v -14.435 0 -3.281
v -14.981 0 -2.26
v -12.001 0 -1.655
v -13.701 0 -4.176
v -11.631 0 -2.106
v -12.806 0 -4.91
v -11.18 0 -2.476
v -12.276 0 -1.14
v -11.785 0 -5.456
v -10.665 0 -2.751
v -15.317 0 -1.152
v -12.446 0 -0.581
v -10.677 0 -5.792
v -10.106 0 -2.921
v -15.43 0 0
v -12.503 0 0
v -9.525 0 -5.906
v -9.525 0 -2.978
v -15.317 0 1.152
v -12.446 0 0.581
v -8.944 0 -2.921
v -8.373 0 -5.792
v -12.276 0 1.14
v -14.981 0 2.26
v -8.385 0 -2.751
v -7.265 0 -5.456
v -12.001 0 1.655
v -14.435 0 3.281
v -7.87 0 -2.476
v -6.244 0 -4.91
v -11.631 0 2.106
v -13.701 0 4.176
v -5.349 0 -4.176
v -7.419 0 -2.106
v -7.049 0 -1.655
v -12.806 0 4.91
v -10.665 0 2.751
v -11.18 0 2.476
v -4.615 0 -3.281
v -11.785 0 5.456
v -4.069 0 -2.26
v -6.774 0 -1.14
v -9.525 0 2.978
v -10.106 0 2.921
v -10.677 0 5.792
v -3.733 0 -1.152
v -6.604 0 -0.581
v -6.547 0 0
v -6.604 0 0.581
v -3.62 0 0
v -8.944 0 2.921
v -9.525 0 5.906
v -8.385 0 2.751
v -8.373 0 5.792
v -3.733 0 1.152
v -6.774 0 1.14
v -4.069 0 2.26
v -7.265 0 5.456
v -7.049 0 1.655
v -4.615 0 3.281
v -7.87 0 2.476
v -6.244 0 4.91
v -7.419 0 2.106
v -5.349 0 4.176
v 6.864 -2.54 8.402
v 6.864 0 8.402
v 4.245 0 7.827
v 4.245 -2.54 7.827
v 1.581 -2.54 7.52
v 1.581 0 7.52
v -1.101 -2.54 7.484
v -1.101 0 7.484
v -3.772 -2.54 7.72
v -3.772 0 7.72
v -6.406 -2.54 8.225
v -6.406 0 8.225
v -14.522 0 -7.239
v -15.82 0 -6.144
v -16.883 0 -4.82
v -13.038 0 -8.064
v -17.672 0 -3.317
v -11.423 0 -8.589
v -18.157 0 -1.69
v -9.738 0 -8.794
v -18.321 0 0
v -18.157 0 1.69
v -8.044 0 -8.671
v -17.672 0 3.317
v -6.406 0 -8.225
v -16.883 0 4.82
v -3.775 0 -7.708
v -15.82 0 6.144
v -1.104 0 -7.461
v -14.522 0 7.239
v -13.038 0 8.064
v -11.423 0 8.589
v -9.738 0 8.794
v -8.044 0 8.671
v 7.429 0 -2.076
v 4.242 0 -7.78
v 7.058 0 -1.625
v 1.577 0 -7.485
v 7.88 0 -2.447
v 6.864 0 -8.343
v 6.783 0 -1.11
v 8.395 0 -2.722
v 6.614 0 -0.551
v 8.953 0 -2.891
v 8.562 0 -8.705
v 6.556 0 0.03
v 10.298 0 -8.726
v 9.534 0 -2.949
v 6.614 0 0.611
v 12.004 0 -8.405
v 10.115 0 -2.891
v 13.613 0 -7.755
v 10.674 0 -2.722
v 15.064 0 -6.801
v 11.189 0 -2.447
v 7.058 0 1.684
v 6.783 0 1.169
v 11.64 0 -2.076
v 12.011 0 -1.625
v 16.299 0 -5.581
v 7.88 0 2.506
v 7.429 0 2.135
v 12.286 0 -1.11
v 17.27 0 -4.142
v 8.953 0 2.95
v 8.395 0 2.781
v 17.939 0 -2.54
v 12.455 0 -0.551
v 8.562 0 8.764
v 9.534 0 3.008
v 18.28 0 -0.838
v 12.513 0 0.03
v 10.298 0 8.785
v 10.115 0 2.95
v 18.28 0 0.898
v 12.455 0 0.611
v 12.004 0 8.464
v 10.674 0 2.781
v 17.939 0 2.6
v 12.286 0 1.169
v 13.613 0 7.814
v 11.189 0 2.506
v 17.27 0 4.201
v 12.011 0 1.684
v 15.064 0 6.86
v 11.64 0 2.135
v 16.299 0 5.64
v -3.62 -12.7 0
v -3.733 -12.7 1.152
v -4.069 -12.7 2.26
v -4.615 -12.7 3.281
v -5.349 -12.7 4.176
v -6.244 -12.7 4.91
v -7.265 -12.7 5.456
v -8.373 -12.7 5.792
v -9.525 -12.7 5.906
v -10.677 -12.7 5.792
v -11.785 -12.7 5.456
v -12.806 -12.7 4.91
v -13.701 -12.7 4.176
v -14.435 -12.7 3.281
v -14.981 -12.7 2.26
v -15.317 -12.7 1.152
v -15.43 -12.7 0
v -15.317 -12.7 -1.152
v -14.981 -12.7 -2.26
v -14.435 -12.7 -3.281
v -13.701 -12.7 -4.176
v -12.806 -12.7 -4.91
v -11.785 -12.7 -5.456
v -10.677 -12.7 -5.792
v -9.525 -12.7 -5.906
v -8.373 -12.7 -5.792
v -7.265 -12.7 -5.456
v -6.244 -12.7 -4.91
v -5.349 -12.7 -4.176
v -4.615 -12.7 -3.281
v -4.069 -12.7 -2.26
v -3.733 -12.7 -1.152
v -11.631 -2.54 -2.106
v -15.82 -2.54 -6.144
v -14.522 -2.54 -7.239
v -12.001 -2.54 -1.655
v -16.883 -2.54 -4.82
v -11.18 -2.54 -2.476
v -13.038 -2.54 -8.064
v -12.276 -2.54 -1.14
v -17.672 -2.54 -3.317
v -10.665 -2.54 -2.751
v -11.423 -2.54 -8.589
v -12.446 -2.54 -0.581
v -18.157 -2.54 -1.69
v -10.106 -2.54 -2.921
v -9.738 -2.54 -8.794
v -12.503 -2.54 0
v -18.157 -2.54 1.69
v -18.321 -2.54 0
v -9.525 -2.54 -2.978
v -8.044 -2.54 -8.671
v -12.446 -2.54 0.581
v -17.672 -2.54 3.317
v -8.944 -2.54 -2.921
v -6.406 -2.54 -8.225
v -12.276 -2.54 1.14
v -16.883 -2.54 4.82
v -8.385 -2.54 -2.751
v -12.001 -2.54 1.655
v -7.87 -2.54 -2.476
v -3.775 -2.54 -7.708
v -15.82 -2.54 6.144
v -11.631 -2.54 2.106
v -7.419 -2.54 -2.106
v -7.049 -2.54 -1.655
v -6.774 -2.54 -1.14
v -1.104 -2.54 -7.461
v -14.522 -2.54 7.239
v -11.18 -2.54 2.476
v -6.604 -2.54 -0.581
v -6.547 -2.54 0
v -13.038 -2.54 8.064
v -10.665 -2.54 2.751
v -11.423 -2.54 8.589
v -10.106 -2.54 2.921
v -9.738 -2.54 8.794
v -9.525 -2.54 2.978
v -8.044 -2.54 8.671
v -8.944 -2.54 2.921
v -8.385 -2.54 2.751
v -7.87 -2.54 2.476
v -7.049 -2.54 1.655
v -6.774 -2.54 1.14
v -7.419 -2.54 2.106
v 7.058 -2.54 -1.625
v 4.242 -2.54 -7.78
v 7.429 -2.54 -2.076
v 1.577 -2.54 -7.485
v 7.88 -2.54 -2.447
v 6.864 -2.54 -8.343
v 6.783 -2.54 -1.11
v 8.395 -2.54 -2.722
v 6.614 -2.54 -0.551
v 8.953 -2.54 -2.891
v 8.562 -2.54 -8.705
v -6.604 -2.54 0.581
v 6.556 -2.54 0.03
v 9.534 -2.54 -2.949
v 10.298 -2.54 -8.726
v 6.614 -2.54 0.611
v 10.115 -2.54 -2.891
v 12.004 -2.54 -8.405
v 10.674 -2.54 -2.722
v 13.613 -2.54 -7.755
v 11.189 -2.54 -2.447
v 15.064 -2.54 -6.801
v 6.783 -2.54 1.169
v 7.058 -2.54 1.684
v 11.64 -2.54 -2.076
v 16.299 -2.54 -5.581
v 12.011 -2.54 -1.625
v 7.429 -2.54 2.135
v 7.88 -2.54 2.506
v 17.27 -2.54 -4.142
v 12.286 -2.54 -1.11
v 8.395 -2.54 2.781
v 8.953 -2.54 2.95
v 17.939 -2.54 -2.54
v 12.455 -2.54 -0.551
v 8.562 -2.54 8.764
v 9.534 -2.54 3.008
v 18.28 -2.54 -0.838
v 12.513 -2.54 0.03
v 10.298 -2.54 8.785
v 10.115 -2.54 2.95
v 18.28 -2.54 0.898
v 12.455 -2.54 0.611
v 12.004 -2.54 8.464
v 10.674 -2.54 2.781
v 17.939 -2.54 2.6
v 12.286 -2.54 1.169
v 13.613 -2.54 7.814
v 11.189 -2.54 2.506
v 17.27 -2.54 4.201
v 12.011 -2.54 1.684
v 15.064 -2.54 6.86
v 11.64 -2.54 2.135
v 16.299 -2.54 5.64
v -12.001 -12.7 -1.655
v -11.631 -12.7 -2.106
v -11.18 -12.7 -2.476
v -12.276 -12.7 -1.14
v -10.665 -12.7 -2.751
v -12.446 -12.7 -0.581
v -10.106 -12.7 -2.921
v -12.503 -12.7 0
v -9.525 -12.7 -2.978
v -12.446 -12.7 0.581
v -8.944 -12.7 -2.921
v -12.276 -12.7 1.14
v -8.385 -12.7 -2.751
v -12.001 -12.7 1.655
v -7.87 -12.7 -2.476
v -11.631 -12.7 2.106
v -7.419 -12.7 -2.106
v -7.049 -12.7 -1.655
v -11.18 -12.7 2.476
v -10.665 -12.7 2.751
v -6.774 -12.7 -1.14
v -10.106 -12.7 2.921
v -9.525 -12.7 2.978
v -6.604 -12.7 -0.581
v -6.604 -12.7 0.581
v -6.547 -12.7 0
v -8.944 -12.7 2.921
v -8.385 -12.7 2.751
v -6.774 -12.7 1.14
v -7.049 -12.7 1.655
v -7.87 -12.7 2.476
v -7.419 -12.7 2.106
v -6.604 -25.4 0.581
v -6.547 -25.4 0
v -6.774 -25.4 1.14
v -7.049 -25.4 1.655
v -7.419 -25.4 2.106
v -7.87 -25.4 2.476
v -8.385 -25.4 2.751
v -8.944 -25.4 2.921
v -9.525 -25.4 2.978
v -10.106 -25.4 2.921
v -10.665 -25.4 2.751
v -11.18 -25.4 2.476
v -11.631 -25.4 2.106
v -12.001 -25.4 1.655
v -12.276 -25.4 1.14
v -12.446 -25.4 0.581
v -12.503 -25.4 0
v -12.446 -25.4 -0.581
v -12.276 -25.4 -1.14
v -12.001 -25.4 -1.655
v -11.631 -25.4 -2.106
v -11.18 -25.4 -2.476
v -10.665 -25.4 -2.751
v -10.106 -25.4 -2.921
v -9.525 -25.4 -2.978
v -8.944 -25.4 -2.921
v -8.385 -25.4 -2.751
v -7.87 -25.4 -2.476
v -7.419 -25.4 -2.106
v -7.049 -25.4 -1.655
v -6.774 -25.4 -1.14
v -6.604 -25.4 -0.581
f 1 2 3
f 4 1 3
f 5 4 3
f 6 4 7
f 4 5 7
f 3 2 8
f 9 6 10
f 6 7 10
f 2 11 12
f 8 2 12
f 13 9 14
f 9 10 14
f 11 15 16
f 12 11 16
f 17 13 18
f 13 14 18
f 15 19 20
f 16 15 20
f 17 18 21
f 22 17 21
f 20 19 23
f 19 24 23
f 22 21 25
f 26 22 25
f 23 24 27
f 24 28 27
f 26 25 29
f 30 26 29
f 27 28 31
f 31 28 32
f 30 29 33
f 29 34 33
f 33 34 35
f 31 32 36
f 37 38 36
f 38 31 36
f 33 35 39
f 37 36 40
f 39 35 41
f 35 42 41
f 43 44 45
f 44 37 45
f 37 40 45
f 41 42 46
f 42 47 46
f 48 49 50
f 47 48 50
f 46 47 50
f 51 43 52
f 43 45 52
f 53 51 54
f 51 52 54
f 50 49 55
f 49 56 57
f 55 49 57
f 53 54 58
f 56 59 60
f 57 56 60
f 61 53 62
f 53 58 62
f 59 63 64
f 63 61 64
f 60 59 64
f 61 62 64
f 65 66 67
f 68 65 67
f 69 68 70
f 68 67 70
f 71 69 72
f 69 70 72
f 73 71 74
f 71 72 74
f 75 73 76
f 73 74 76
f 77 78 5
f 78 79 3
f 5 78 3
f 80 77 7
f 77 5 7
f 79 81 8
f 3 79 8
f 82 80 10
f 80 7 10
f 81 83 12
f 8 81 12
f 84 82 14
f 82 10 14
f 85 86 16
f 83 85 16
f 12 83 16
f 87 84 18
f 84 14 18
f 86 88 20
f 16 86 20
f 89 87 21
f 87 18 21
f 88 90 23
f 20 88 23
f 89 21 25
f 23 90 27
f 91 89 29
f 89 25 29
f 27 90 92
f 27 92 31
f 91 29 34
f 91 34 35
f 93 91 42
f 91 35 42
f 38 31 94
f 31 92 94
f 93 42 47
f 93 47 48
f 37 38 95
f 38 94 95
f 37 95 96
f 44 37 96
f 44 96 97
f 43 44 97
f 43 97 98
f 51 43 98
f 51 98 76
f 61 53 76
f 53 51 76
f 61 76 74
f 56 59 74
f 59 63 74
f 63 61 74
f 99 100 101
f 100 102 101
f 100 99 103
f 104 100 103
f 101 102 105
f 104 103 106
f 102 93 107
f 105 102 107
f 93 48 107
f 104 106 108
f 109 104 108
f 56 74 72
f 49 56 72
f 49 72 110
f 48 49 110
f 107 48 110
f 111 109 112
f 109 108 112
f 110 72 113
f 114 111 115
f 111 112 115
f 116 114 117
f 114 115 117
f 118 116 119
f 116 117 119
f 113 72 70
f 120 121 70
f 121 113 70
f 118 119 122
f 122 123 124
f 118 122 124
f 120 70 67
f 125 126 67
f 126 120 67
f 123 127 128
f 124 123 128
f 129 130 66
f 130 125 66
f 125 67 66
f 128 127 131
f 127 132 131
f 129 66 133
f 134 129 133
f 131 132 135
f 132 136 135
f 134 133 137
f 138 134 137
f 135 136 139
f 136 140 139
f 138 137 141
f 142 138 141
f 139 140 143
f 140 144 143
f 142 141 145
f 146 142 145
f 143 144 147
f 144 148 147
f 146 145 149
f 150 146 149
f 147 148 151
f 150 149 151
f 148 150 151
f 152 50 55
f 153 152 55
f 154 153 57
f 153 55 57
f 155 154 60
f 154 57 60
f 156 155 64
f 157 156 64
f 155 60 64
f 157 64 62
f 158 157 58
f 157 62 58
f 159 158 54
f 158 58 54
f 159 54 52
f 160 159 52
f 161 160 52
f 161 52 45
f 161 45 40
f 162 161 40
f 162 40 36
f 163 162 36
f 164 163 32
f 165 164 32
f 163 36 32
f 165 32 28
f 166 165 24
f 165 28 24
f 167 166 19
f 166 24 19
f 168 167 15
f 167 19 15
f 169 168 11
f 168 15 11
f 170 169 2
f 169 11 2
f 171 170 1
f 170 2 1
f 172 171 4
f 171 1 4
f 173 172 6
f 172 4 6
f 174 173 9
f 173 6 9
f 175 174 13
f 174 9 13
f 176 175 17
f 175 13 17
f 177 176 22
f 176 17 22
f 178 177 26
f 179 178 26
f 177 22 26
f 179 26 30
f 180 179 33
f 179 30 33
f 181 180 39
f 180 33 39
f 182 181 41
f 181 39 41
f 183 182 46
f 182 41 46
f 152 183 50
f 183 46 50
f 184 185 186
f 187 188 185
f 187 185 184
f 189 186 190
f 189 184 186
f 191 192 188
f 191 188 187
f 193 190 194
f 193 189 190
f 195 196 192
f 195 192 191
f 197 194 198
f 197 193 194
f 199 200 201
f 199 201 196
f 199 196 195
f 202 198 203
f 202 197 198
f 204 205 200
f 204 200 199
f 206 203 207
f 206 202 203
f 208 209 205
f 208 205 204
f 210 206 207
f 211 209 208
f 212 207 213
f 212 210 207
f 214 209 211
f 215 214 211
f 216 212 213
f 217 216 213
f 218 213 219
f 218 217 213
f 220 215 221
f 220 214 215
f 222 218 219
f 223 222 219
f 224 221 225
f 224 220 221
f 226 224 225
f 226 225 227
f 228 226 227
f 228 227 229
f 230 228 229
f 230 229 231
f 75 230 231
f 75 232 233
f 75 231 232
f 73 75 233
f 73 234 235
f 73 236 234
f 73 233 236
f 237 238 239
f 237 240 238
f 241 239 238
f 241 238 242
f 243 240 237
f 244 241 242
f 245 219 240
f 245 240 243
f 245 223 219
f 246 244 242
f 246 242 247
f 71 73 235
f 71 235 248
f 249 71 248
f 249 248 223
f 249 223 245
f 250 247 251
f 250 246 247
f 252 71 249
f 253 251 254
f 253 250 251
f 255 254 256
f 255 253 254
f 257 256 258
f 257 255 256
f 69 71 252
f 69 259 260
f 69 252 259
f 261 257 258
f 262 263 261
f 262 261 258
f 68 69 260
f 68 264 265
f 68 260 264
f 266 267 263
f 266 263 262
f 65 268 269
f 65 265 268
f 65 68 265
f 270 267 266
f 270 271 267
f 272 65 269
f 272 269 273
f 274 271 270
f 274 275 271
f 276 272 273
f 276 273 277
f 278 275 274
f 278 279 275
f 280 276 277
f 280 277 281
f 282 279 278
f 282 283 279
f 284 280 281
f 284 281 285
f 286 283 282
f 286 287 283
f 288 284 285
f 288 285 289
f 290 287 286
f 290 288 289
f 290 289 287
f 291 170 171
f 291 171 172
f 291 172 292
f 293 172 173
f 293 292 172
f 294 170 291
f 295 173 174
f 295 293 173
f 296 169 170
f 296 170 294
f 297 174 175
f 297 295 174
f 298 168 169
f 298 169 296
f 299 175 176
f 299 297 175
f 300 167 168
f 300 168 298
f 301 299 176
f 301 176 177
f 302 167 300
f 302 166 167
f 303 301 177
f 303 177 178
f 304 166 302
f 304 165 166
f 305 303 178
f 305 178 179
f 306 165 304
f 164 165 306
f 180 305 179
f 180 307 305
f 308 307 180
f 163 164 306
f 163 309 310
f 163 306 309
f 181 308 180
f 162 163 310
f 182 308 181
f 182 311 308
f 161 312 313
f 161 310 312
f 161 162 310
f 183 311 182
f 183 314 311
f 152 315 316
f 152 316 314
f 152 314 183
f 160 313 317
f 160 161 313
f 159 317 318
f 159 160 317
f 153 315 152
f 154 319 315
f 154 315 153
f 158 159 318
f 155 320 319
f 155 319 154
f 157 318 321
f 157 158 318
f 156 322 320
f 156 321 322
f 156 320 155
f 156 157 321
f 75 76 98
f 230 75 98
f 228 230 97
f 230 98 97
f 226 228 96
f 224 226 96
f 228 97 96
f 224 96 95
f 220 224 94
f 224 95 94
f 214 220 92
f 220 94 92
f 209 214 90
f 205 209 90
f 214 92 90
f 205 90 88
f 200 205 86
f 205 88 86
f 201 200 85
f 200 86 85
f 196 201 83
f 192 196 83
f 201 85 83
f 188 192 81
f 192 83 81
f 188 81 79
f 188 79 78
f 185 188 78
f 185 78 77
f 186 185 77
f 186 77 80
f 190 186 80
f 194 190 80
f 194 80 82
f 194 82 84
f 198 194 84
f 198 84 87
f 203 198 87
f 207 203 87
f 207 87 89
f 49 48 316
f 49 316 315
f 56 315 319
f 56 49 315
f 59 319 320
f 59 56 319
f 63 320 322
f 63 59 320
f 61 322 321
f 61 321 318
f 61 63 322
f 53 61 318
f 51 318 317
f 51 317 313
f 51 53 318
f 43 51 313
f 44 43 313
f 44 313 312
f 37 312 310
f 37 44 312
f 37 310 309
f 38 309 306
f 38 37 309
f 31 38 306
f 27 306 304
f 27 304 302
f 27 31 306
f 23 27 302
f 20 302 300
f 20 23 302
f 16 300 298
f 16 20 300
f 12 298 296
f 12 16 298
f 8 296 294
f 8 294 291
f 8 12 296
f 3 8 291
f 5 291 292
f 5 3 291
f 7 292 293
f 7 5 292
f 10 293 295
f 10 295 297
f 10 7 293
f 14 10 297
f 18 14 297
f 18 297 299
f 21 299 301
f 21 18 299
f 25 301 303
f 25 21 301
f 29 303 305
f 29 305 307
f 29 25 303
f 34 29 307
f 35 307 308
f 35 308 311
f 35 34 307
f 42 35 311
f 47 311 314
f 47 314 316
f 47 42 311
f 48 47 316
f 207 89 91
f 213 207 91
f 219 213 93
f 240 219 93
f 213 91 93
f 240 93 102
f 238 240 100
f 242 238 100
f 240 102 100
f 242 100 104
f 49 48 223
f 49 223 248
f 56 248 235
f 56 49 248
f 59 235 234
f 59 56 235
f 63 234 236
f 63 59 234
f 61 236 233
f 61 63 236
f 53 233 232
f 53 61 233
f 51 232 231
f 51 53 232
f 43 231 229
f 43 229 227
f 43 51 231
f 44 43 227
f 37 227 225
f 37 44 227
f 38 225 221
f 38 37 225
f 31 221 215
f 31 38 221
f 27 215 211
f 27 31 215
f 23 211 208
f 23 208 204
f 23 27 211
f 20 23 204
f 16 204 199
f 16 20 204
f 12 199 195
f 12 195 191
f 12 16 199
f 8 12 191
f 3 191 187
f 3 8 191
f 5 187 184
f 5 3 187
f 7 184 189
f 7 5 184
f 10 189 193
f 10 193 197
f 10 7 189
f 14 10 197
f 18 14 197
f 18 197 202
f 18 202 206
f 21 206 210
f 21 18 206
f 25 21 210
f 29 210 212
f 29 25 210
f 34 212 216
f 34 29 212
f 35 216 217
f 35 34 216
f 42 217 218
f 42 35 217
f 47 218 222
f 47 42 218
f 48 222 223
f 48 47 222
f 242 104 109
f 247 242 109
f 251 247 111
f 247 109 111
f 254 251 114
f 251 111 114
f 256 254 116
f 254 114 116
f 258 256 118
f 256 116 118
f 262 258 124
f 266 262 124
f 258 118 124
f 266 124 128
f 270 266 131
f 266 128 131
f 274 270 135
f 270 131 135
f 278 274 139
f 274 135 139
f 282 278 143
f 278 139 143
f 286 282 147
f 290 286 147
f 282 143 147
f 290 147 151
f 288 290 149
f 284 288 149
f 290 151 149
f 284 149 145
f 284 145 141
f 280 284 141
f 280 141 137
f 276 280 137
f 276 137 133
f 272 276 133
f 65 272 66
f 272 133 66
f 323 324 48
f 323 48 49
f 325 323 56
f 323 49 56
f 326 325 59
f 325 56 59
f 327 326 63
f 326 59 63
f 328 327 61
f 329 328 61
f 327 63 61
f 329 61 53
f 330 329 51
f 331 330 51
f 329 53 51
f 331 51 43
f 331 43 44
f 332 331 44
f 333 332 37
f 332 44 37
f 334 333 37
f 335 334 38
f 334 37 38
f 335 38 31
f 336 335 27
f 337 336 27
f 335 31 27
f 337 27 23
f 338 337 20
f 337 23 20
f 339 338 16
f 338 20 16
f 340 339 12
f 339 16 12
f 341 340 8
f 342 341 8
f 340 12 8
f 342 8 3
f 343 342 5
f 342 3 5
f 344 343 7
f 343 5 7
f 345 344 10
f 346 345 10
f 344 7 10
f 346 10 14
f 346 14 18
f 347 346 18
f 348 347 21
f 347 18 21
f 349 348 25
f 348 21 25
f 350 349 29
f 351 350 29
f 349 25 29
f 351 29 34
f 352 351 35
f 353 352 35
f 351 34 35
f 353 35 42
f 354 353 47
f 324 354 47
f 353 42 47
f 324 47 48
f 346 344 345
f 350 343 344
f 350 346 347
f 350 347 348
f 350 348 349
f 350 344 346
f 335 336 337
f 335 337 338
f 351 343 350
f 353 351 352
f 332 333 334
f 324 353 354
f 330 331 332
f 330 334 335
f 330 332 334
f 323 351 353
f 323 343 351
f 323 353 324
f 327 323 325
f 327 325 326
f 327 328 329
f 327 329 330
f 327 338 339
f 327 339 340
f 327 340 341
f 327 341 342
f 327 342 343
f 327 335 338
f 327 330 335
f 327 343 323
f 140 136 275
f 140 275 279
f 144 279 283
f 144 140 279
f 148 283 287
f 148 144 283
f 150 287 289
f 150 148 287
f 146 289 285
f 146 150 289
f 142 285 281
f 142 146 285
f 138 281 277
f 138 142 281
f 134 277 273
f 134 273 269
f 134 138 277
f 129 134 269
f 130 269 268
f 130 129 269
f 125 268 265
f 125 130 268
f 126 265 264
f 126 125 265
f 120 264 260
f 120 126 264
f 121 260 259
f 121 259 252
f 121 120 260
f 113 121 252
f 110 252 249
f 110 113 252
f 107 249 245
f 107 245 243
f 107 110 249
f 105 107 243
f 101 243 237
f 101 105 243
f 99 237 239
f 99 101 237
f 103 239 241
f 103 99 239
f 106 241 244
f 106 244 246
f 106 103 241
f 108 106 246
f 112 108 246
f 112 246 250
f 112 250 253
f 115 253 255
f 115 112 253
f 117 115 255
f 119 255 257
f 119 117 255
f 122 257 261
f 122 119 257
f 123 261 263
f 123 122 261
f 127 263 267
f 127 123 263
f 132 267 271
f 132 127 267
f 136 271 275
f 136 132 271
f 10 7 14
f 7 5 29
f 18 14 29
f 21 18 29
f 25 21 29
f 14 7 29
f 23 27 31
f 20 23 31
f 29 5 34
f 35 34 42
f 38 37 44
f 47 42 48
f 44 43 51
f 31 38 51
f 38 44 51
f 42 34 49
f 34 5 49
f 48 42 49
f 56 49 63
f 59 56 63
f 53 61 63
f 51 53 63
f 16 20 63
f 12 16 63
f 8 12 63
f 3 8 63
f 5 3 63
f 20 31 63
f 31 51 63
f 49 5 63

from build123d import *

# Parameters (mm, degrees)
F0_R     = 2.97815
F1_DEPTH = 2.54
F2_DEPTH = 25.4
F3_R     = 5.9055
F3_R_2   = 2.97815
F4_DEPTH = 12.7


with BuildPart() as f1:
    # F0 (on Front) → F1 (new body)
    with BuildSketch(Plane.XZ):
        with BuildLine():
            ThreePointArc((6.864087, 8.402444), (0.240415, 7.468325), (-6.405902, 8.224677))
            ThreePointArc((-6.405902, 8.224677), (-18.321254, 0), (-6.405902, -8.224677))
            ThreePointArc((-6.405902, -8.224677), (0.23665, -7.438813), (6.864087, -8.343333))
            ThreePointArc((6.864087, -8.343333), (18.322826, 0.029555), (6.864087, 8.402444))
        make_face()
        with Locations((-9.525, 0)):
            Circle(F0_R, mode=Mode.SUBTRACT)
        with Locations((9.534426, 0.029555)):
            Circle(F0_R, mode=Mode.SUBTRACT)
    extrude(amount=F1_DEPTH)


with BuildPart() as f2:
    # F0 (on Front) → F2 (new body)
    with BuildSketch(Plane.XZ):
        with Locations((-9.525, 0)):
            Circle(F0_R)
    extrude(amount=F2_DEPTH)


with BuildPart() as f4:
    # F3 (on face) → F4 (new body)
    with BuildSketch(Plane.XZ):
        with Locations((-9.525, 0)):
            Circle(F3_R)
        with Locations((-9.525, 0)):
            Circle(F3_R_2, mode=Mode.SUBTRACT)
    extrude(amount=F4_DEPTH)


solid = Compound([f1.part, f2.part, f4.part])
